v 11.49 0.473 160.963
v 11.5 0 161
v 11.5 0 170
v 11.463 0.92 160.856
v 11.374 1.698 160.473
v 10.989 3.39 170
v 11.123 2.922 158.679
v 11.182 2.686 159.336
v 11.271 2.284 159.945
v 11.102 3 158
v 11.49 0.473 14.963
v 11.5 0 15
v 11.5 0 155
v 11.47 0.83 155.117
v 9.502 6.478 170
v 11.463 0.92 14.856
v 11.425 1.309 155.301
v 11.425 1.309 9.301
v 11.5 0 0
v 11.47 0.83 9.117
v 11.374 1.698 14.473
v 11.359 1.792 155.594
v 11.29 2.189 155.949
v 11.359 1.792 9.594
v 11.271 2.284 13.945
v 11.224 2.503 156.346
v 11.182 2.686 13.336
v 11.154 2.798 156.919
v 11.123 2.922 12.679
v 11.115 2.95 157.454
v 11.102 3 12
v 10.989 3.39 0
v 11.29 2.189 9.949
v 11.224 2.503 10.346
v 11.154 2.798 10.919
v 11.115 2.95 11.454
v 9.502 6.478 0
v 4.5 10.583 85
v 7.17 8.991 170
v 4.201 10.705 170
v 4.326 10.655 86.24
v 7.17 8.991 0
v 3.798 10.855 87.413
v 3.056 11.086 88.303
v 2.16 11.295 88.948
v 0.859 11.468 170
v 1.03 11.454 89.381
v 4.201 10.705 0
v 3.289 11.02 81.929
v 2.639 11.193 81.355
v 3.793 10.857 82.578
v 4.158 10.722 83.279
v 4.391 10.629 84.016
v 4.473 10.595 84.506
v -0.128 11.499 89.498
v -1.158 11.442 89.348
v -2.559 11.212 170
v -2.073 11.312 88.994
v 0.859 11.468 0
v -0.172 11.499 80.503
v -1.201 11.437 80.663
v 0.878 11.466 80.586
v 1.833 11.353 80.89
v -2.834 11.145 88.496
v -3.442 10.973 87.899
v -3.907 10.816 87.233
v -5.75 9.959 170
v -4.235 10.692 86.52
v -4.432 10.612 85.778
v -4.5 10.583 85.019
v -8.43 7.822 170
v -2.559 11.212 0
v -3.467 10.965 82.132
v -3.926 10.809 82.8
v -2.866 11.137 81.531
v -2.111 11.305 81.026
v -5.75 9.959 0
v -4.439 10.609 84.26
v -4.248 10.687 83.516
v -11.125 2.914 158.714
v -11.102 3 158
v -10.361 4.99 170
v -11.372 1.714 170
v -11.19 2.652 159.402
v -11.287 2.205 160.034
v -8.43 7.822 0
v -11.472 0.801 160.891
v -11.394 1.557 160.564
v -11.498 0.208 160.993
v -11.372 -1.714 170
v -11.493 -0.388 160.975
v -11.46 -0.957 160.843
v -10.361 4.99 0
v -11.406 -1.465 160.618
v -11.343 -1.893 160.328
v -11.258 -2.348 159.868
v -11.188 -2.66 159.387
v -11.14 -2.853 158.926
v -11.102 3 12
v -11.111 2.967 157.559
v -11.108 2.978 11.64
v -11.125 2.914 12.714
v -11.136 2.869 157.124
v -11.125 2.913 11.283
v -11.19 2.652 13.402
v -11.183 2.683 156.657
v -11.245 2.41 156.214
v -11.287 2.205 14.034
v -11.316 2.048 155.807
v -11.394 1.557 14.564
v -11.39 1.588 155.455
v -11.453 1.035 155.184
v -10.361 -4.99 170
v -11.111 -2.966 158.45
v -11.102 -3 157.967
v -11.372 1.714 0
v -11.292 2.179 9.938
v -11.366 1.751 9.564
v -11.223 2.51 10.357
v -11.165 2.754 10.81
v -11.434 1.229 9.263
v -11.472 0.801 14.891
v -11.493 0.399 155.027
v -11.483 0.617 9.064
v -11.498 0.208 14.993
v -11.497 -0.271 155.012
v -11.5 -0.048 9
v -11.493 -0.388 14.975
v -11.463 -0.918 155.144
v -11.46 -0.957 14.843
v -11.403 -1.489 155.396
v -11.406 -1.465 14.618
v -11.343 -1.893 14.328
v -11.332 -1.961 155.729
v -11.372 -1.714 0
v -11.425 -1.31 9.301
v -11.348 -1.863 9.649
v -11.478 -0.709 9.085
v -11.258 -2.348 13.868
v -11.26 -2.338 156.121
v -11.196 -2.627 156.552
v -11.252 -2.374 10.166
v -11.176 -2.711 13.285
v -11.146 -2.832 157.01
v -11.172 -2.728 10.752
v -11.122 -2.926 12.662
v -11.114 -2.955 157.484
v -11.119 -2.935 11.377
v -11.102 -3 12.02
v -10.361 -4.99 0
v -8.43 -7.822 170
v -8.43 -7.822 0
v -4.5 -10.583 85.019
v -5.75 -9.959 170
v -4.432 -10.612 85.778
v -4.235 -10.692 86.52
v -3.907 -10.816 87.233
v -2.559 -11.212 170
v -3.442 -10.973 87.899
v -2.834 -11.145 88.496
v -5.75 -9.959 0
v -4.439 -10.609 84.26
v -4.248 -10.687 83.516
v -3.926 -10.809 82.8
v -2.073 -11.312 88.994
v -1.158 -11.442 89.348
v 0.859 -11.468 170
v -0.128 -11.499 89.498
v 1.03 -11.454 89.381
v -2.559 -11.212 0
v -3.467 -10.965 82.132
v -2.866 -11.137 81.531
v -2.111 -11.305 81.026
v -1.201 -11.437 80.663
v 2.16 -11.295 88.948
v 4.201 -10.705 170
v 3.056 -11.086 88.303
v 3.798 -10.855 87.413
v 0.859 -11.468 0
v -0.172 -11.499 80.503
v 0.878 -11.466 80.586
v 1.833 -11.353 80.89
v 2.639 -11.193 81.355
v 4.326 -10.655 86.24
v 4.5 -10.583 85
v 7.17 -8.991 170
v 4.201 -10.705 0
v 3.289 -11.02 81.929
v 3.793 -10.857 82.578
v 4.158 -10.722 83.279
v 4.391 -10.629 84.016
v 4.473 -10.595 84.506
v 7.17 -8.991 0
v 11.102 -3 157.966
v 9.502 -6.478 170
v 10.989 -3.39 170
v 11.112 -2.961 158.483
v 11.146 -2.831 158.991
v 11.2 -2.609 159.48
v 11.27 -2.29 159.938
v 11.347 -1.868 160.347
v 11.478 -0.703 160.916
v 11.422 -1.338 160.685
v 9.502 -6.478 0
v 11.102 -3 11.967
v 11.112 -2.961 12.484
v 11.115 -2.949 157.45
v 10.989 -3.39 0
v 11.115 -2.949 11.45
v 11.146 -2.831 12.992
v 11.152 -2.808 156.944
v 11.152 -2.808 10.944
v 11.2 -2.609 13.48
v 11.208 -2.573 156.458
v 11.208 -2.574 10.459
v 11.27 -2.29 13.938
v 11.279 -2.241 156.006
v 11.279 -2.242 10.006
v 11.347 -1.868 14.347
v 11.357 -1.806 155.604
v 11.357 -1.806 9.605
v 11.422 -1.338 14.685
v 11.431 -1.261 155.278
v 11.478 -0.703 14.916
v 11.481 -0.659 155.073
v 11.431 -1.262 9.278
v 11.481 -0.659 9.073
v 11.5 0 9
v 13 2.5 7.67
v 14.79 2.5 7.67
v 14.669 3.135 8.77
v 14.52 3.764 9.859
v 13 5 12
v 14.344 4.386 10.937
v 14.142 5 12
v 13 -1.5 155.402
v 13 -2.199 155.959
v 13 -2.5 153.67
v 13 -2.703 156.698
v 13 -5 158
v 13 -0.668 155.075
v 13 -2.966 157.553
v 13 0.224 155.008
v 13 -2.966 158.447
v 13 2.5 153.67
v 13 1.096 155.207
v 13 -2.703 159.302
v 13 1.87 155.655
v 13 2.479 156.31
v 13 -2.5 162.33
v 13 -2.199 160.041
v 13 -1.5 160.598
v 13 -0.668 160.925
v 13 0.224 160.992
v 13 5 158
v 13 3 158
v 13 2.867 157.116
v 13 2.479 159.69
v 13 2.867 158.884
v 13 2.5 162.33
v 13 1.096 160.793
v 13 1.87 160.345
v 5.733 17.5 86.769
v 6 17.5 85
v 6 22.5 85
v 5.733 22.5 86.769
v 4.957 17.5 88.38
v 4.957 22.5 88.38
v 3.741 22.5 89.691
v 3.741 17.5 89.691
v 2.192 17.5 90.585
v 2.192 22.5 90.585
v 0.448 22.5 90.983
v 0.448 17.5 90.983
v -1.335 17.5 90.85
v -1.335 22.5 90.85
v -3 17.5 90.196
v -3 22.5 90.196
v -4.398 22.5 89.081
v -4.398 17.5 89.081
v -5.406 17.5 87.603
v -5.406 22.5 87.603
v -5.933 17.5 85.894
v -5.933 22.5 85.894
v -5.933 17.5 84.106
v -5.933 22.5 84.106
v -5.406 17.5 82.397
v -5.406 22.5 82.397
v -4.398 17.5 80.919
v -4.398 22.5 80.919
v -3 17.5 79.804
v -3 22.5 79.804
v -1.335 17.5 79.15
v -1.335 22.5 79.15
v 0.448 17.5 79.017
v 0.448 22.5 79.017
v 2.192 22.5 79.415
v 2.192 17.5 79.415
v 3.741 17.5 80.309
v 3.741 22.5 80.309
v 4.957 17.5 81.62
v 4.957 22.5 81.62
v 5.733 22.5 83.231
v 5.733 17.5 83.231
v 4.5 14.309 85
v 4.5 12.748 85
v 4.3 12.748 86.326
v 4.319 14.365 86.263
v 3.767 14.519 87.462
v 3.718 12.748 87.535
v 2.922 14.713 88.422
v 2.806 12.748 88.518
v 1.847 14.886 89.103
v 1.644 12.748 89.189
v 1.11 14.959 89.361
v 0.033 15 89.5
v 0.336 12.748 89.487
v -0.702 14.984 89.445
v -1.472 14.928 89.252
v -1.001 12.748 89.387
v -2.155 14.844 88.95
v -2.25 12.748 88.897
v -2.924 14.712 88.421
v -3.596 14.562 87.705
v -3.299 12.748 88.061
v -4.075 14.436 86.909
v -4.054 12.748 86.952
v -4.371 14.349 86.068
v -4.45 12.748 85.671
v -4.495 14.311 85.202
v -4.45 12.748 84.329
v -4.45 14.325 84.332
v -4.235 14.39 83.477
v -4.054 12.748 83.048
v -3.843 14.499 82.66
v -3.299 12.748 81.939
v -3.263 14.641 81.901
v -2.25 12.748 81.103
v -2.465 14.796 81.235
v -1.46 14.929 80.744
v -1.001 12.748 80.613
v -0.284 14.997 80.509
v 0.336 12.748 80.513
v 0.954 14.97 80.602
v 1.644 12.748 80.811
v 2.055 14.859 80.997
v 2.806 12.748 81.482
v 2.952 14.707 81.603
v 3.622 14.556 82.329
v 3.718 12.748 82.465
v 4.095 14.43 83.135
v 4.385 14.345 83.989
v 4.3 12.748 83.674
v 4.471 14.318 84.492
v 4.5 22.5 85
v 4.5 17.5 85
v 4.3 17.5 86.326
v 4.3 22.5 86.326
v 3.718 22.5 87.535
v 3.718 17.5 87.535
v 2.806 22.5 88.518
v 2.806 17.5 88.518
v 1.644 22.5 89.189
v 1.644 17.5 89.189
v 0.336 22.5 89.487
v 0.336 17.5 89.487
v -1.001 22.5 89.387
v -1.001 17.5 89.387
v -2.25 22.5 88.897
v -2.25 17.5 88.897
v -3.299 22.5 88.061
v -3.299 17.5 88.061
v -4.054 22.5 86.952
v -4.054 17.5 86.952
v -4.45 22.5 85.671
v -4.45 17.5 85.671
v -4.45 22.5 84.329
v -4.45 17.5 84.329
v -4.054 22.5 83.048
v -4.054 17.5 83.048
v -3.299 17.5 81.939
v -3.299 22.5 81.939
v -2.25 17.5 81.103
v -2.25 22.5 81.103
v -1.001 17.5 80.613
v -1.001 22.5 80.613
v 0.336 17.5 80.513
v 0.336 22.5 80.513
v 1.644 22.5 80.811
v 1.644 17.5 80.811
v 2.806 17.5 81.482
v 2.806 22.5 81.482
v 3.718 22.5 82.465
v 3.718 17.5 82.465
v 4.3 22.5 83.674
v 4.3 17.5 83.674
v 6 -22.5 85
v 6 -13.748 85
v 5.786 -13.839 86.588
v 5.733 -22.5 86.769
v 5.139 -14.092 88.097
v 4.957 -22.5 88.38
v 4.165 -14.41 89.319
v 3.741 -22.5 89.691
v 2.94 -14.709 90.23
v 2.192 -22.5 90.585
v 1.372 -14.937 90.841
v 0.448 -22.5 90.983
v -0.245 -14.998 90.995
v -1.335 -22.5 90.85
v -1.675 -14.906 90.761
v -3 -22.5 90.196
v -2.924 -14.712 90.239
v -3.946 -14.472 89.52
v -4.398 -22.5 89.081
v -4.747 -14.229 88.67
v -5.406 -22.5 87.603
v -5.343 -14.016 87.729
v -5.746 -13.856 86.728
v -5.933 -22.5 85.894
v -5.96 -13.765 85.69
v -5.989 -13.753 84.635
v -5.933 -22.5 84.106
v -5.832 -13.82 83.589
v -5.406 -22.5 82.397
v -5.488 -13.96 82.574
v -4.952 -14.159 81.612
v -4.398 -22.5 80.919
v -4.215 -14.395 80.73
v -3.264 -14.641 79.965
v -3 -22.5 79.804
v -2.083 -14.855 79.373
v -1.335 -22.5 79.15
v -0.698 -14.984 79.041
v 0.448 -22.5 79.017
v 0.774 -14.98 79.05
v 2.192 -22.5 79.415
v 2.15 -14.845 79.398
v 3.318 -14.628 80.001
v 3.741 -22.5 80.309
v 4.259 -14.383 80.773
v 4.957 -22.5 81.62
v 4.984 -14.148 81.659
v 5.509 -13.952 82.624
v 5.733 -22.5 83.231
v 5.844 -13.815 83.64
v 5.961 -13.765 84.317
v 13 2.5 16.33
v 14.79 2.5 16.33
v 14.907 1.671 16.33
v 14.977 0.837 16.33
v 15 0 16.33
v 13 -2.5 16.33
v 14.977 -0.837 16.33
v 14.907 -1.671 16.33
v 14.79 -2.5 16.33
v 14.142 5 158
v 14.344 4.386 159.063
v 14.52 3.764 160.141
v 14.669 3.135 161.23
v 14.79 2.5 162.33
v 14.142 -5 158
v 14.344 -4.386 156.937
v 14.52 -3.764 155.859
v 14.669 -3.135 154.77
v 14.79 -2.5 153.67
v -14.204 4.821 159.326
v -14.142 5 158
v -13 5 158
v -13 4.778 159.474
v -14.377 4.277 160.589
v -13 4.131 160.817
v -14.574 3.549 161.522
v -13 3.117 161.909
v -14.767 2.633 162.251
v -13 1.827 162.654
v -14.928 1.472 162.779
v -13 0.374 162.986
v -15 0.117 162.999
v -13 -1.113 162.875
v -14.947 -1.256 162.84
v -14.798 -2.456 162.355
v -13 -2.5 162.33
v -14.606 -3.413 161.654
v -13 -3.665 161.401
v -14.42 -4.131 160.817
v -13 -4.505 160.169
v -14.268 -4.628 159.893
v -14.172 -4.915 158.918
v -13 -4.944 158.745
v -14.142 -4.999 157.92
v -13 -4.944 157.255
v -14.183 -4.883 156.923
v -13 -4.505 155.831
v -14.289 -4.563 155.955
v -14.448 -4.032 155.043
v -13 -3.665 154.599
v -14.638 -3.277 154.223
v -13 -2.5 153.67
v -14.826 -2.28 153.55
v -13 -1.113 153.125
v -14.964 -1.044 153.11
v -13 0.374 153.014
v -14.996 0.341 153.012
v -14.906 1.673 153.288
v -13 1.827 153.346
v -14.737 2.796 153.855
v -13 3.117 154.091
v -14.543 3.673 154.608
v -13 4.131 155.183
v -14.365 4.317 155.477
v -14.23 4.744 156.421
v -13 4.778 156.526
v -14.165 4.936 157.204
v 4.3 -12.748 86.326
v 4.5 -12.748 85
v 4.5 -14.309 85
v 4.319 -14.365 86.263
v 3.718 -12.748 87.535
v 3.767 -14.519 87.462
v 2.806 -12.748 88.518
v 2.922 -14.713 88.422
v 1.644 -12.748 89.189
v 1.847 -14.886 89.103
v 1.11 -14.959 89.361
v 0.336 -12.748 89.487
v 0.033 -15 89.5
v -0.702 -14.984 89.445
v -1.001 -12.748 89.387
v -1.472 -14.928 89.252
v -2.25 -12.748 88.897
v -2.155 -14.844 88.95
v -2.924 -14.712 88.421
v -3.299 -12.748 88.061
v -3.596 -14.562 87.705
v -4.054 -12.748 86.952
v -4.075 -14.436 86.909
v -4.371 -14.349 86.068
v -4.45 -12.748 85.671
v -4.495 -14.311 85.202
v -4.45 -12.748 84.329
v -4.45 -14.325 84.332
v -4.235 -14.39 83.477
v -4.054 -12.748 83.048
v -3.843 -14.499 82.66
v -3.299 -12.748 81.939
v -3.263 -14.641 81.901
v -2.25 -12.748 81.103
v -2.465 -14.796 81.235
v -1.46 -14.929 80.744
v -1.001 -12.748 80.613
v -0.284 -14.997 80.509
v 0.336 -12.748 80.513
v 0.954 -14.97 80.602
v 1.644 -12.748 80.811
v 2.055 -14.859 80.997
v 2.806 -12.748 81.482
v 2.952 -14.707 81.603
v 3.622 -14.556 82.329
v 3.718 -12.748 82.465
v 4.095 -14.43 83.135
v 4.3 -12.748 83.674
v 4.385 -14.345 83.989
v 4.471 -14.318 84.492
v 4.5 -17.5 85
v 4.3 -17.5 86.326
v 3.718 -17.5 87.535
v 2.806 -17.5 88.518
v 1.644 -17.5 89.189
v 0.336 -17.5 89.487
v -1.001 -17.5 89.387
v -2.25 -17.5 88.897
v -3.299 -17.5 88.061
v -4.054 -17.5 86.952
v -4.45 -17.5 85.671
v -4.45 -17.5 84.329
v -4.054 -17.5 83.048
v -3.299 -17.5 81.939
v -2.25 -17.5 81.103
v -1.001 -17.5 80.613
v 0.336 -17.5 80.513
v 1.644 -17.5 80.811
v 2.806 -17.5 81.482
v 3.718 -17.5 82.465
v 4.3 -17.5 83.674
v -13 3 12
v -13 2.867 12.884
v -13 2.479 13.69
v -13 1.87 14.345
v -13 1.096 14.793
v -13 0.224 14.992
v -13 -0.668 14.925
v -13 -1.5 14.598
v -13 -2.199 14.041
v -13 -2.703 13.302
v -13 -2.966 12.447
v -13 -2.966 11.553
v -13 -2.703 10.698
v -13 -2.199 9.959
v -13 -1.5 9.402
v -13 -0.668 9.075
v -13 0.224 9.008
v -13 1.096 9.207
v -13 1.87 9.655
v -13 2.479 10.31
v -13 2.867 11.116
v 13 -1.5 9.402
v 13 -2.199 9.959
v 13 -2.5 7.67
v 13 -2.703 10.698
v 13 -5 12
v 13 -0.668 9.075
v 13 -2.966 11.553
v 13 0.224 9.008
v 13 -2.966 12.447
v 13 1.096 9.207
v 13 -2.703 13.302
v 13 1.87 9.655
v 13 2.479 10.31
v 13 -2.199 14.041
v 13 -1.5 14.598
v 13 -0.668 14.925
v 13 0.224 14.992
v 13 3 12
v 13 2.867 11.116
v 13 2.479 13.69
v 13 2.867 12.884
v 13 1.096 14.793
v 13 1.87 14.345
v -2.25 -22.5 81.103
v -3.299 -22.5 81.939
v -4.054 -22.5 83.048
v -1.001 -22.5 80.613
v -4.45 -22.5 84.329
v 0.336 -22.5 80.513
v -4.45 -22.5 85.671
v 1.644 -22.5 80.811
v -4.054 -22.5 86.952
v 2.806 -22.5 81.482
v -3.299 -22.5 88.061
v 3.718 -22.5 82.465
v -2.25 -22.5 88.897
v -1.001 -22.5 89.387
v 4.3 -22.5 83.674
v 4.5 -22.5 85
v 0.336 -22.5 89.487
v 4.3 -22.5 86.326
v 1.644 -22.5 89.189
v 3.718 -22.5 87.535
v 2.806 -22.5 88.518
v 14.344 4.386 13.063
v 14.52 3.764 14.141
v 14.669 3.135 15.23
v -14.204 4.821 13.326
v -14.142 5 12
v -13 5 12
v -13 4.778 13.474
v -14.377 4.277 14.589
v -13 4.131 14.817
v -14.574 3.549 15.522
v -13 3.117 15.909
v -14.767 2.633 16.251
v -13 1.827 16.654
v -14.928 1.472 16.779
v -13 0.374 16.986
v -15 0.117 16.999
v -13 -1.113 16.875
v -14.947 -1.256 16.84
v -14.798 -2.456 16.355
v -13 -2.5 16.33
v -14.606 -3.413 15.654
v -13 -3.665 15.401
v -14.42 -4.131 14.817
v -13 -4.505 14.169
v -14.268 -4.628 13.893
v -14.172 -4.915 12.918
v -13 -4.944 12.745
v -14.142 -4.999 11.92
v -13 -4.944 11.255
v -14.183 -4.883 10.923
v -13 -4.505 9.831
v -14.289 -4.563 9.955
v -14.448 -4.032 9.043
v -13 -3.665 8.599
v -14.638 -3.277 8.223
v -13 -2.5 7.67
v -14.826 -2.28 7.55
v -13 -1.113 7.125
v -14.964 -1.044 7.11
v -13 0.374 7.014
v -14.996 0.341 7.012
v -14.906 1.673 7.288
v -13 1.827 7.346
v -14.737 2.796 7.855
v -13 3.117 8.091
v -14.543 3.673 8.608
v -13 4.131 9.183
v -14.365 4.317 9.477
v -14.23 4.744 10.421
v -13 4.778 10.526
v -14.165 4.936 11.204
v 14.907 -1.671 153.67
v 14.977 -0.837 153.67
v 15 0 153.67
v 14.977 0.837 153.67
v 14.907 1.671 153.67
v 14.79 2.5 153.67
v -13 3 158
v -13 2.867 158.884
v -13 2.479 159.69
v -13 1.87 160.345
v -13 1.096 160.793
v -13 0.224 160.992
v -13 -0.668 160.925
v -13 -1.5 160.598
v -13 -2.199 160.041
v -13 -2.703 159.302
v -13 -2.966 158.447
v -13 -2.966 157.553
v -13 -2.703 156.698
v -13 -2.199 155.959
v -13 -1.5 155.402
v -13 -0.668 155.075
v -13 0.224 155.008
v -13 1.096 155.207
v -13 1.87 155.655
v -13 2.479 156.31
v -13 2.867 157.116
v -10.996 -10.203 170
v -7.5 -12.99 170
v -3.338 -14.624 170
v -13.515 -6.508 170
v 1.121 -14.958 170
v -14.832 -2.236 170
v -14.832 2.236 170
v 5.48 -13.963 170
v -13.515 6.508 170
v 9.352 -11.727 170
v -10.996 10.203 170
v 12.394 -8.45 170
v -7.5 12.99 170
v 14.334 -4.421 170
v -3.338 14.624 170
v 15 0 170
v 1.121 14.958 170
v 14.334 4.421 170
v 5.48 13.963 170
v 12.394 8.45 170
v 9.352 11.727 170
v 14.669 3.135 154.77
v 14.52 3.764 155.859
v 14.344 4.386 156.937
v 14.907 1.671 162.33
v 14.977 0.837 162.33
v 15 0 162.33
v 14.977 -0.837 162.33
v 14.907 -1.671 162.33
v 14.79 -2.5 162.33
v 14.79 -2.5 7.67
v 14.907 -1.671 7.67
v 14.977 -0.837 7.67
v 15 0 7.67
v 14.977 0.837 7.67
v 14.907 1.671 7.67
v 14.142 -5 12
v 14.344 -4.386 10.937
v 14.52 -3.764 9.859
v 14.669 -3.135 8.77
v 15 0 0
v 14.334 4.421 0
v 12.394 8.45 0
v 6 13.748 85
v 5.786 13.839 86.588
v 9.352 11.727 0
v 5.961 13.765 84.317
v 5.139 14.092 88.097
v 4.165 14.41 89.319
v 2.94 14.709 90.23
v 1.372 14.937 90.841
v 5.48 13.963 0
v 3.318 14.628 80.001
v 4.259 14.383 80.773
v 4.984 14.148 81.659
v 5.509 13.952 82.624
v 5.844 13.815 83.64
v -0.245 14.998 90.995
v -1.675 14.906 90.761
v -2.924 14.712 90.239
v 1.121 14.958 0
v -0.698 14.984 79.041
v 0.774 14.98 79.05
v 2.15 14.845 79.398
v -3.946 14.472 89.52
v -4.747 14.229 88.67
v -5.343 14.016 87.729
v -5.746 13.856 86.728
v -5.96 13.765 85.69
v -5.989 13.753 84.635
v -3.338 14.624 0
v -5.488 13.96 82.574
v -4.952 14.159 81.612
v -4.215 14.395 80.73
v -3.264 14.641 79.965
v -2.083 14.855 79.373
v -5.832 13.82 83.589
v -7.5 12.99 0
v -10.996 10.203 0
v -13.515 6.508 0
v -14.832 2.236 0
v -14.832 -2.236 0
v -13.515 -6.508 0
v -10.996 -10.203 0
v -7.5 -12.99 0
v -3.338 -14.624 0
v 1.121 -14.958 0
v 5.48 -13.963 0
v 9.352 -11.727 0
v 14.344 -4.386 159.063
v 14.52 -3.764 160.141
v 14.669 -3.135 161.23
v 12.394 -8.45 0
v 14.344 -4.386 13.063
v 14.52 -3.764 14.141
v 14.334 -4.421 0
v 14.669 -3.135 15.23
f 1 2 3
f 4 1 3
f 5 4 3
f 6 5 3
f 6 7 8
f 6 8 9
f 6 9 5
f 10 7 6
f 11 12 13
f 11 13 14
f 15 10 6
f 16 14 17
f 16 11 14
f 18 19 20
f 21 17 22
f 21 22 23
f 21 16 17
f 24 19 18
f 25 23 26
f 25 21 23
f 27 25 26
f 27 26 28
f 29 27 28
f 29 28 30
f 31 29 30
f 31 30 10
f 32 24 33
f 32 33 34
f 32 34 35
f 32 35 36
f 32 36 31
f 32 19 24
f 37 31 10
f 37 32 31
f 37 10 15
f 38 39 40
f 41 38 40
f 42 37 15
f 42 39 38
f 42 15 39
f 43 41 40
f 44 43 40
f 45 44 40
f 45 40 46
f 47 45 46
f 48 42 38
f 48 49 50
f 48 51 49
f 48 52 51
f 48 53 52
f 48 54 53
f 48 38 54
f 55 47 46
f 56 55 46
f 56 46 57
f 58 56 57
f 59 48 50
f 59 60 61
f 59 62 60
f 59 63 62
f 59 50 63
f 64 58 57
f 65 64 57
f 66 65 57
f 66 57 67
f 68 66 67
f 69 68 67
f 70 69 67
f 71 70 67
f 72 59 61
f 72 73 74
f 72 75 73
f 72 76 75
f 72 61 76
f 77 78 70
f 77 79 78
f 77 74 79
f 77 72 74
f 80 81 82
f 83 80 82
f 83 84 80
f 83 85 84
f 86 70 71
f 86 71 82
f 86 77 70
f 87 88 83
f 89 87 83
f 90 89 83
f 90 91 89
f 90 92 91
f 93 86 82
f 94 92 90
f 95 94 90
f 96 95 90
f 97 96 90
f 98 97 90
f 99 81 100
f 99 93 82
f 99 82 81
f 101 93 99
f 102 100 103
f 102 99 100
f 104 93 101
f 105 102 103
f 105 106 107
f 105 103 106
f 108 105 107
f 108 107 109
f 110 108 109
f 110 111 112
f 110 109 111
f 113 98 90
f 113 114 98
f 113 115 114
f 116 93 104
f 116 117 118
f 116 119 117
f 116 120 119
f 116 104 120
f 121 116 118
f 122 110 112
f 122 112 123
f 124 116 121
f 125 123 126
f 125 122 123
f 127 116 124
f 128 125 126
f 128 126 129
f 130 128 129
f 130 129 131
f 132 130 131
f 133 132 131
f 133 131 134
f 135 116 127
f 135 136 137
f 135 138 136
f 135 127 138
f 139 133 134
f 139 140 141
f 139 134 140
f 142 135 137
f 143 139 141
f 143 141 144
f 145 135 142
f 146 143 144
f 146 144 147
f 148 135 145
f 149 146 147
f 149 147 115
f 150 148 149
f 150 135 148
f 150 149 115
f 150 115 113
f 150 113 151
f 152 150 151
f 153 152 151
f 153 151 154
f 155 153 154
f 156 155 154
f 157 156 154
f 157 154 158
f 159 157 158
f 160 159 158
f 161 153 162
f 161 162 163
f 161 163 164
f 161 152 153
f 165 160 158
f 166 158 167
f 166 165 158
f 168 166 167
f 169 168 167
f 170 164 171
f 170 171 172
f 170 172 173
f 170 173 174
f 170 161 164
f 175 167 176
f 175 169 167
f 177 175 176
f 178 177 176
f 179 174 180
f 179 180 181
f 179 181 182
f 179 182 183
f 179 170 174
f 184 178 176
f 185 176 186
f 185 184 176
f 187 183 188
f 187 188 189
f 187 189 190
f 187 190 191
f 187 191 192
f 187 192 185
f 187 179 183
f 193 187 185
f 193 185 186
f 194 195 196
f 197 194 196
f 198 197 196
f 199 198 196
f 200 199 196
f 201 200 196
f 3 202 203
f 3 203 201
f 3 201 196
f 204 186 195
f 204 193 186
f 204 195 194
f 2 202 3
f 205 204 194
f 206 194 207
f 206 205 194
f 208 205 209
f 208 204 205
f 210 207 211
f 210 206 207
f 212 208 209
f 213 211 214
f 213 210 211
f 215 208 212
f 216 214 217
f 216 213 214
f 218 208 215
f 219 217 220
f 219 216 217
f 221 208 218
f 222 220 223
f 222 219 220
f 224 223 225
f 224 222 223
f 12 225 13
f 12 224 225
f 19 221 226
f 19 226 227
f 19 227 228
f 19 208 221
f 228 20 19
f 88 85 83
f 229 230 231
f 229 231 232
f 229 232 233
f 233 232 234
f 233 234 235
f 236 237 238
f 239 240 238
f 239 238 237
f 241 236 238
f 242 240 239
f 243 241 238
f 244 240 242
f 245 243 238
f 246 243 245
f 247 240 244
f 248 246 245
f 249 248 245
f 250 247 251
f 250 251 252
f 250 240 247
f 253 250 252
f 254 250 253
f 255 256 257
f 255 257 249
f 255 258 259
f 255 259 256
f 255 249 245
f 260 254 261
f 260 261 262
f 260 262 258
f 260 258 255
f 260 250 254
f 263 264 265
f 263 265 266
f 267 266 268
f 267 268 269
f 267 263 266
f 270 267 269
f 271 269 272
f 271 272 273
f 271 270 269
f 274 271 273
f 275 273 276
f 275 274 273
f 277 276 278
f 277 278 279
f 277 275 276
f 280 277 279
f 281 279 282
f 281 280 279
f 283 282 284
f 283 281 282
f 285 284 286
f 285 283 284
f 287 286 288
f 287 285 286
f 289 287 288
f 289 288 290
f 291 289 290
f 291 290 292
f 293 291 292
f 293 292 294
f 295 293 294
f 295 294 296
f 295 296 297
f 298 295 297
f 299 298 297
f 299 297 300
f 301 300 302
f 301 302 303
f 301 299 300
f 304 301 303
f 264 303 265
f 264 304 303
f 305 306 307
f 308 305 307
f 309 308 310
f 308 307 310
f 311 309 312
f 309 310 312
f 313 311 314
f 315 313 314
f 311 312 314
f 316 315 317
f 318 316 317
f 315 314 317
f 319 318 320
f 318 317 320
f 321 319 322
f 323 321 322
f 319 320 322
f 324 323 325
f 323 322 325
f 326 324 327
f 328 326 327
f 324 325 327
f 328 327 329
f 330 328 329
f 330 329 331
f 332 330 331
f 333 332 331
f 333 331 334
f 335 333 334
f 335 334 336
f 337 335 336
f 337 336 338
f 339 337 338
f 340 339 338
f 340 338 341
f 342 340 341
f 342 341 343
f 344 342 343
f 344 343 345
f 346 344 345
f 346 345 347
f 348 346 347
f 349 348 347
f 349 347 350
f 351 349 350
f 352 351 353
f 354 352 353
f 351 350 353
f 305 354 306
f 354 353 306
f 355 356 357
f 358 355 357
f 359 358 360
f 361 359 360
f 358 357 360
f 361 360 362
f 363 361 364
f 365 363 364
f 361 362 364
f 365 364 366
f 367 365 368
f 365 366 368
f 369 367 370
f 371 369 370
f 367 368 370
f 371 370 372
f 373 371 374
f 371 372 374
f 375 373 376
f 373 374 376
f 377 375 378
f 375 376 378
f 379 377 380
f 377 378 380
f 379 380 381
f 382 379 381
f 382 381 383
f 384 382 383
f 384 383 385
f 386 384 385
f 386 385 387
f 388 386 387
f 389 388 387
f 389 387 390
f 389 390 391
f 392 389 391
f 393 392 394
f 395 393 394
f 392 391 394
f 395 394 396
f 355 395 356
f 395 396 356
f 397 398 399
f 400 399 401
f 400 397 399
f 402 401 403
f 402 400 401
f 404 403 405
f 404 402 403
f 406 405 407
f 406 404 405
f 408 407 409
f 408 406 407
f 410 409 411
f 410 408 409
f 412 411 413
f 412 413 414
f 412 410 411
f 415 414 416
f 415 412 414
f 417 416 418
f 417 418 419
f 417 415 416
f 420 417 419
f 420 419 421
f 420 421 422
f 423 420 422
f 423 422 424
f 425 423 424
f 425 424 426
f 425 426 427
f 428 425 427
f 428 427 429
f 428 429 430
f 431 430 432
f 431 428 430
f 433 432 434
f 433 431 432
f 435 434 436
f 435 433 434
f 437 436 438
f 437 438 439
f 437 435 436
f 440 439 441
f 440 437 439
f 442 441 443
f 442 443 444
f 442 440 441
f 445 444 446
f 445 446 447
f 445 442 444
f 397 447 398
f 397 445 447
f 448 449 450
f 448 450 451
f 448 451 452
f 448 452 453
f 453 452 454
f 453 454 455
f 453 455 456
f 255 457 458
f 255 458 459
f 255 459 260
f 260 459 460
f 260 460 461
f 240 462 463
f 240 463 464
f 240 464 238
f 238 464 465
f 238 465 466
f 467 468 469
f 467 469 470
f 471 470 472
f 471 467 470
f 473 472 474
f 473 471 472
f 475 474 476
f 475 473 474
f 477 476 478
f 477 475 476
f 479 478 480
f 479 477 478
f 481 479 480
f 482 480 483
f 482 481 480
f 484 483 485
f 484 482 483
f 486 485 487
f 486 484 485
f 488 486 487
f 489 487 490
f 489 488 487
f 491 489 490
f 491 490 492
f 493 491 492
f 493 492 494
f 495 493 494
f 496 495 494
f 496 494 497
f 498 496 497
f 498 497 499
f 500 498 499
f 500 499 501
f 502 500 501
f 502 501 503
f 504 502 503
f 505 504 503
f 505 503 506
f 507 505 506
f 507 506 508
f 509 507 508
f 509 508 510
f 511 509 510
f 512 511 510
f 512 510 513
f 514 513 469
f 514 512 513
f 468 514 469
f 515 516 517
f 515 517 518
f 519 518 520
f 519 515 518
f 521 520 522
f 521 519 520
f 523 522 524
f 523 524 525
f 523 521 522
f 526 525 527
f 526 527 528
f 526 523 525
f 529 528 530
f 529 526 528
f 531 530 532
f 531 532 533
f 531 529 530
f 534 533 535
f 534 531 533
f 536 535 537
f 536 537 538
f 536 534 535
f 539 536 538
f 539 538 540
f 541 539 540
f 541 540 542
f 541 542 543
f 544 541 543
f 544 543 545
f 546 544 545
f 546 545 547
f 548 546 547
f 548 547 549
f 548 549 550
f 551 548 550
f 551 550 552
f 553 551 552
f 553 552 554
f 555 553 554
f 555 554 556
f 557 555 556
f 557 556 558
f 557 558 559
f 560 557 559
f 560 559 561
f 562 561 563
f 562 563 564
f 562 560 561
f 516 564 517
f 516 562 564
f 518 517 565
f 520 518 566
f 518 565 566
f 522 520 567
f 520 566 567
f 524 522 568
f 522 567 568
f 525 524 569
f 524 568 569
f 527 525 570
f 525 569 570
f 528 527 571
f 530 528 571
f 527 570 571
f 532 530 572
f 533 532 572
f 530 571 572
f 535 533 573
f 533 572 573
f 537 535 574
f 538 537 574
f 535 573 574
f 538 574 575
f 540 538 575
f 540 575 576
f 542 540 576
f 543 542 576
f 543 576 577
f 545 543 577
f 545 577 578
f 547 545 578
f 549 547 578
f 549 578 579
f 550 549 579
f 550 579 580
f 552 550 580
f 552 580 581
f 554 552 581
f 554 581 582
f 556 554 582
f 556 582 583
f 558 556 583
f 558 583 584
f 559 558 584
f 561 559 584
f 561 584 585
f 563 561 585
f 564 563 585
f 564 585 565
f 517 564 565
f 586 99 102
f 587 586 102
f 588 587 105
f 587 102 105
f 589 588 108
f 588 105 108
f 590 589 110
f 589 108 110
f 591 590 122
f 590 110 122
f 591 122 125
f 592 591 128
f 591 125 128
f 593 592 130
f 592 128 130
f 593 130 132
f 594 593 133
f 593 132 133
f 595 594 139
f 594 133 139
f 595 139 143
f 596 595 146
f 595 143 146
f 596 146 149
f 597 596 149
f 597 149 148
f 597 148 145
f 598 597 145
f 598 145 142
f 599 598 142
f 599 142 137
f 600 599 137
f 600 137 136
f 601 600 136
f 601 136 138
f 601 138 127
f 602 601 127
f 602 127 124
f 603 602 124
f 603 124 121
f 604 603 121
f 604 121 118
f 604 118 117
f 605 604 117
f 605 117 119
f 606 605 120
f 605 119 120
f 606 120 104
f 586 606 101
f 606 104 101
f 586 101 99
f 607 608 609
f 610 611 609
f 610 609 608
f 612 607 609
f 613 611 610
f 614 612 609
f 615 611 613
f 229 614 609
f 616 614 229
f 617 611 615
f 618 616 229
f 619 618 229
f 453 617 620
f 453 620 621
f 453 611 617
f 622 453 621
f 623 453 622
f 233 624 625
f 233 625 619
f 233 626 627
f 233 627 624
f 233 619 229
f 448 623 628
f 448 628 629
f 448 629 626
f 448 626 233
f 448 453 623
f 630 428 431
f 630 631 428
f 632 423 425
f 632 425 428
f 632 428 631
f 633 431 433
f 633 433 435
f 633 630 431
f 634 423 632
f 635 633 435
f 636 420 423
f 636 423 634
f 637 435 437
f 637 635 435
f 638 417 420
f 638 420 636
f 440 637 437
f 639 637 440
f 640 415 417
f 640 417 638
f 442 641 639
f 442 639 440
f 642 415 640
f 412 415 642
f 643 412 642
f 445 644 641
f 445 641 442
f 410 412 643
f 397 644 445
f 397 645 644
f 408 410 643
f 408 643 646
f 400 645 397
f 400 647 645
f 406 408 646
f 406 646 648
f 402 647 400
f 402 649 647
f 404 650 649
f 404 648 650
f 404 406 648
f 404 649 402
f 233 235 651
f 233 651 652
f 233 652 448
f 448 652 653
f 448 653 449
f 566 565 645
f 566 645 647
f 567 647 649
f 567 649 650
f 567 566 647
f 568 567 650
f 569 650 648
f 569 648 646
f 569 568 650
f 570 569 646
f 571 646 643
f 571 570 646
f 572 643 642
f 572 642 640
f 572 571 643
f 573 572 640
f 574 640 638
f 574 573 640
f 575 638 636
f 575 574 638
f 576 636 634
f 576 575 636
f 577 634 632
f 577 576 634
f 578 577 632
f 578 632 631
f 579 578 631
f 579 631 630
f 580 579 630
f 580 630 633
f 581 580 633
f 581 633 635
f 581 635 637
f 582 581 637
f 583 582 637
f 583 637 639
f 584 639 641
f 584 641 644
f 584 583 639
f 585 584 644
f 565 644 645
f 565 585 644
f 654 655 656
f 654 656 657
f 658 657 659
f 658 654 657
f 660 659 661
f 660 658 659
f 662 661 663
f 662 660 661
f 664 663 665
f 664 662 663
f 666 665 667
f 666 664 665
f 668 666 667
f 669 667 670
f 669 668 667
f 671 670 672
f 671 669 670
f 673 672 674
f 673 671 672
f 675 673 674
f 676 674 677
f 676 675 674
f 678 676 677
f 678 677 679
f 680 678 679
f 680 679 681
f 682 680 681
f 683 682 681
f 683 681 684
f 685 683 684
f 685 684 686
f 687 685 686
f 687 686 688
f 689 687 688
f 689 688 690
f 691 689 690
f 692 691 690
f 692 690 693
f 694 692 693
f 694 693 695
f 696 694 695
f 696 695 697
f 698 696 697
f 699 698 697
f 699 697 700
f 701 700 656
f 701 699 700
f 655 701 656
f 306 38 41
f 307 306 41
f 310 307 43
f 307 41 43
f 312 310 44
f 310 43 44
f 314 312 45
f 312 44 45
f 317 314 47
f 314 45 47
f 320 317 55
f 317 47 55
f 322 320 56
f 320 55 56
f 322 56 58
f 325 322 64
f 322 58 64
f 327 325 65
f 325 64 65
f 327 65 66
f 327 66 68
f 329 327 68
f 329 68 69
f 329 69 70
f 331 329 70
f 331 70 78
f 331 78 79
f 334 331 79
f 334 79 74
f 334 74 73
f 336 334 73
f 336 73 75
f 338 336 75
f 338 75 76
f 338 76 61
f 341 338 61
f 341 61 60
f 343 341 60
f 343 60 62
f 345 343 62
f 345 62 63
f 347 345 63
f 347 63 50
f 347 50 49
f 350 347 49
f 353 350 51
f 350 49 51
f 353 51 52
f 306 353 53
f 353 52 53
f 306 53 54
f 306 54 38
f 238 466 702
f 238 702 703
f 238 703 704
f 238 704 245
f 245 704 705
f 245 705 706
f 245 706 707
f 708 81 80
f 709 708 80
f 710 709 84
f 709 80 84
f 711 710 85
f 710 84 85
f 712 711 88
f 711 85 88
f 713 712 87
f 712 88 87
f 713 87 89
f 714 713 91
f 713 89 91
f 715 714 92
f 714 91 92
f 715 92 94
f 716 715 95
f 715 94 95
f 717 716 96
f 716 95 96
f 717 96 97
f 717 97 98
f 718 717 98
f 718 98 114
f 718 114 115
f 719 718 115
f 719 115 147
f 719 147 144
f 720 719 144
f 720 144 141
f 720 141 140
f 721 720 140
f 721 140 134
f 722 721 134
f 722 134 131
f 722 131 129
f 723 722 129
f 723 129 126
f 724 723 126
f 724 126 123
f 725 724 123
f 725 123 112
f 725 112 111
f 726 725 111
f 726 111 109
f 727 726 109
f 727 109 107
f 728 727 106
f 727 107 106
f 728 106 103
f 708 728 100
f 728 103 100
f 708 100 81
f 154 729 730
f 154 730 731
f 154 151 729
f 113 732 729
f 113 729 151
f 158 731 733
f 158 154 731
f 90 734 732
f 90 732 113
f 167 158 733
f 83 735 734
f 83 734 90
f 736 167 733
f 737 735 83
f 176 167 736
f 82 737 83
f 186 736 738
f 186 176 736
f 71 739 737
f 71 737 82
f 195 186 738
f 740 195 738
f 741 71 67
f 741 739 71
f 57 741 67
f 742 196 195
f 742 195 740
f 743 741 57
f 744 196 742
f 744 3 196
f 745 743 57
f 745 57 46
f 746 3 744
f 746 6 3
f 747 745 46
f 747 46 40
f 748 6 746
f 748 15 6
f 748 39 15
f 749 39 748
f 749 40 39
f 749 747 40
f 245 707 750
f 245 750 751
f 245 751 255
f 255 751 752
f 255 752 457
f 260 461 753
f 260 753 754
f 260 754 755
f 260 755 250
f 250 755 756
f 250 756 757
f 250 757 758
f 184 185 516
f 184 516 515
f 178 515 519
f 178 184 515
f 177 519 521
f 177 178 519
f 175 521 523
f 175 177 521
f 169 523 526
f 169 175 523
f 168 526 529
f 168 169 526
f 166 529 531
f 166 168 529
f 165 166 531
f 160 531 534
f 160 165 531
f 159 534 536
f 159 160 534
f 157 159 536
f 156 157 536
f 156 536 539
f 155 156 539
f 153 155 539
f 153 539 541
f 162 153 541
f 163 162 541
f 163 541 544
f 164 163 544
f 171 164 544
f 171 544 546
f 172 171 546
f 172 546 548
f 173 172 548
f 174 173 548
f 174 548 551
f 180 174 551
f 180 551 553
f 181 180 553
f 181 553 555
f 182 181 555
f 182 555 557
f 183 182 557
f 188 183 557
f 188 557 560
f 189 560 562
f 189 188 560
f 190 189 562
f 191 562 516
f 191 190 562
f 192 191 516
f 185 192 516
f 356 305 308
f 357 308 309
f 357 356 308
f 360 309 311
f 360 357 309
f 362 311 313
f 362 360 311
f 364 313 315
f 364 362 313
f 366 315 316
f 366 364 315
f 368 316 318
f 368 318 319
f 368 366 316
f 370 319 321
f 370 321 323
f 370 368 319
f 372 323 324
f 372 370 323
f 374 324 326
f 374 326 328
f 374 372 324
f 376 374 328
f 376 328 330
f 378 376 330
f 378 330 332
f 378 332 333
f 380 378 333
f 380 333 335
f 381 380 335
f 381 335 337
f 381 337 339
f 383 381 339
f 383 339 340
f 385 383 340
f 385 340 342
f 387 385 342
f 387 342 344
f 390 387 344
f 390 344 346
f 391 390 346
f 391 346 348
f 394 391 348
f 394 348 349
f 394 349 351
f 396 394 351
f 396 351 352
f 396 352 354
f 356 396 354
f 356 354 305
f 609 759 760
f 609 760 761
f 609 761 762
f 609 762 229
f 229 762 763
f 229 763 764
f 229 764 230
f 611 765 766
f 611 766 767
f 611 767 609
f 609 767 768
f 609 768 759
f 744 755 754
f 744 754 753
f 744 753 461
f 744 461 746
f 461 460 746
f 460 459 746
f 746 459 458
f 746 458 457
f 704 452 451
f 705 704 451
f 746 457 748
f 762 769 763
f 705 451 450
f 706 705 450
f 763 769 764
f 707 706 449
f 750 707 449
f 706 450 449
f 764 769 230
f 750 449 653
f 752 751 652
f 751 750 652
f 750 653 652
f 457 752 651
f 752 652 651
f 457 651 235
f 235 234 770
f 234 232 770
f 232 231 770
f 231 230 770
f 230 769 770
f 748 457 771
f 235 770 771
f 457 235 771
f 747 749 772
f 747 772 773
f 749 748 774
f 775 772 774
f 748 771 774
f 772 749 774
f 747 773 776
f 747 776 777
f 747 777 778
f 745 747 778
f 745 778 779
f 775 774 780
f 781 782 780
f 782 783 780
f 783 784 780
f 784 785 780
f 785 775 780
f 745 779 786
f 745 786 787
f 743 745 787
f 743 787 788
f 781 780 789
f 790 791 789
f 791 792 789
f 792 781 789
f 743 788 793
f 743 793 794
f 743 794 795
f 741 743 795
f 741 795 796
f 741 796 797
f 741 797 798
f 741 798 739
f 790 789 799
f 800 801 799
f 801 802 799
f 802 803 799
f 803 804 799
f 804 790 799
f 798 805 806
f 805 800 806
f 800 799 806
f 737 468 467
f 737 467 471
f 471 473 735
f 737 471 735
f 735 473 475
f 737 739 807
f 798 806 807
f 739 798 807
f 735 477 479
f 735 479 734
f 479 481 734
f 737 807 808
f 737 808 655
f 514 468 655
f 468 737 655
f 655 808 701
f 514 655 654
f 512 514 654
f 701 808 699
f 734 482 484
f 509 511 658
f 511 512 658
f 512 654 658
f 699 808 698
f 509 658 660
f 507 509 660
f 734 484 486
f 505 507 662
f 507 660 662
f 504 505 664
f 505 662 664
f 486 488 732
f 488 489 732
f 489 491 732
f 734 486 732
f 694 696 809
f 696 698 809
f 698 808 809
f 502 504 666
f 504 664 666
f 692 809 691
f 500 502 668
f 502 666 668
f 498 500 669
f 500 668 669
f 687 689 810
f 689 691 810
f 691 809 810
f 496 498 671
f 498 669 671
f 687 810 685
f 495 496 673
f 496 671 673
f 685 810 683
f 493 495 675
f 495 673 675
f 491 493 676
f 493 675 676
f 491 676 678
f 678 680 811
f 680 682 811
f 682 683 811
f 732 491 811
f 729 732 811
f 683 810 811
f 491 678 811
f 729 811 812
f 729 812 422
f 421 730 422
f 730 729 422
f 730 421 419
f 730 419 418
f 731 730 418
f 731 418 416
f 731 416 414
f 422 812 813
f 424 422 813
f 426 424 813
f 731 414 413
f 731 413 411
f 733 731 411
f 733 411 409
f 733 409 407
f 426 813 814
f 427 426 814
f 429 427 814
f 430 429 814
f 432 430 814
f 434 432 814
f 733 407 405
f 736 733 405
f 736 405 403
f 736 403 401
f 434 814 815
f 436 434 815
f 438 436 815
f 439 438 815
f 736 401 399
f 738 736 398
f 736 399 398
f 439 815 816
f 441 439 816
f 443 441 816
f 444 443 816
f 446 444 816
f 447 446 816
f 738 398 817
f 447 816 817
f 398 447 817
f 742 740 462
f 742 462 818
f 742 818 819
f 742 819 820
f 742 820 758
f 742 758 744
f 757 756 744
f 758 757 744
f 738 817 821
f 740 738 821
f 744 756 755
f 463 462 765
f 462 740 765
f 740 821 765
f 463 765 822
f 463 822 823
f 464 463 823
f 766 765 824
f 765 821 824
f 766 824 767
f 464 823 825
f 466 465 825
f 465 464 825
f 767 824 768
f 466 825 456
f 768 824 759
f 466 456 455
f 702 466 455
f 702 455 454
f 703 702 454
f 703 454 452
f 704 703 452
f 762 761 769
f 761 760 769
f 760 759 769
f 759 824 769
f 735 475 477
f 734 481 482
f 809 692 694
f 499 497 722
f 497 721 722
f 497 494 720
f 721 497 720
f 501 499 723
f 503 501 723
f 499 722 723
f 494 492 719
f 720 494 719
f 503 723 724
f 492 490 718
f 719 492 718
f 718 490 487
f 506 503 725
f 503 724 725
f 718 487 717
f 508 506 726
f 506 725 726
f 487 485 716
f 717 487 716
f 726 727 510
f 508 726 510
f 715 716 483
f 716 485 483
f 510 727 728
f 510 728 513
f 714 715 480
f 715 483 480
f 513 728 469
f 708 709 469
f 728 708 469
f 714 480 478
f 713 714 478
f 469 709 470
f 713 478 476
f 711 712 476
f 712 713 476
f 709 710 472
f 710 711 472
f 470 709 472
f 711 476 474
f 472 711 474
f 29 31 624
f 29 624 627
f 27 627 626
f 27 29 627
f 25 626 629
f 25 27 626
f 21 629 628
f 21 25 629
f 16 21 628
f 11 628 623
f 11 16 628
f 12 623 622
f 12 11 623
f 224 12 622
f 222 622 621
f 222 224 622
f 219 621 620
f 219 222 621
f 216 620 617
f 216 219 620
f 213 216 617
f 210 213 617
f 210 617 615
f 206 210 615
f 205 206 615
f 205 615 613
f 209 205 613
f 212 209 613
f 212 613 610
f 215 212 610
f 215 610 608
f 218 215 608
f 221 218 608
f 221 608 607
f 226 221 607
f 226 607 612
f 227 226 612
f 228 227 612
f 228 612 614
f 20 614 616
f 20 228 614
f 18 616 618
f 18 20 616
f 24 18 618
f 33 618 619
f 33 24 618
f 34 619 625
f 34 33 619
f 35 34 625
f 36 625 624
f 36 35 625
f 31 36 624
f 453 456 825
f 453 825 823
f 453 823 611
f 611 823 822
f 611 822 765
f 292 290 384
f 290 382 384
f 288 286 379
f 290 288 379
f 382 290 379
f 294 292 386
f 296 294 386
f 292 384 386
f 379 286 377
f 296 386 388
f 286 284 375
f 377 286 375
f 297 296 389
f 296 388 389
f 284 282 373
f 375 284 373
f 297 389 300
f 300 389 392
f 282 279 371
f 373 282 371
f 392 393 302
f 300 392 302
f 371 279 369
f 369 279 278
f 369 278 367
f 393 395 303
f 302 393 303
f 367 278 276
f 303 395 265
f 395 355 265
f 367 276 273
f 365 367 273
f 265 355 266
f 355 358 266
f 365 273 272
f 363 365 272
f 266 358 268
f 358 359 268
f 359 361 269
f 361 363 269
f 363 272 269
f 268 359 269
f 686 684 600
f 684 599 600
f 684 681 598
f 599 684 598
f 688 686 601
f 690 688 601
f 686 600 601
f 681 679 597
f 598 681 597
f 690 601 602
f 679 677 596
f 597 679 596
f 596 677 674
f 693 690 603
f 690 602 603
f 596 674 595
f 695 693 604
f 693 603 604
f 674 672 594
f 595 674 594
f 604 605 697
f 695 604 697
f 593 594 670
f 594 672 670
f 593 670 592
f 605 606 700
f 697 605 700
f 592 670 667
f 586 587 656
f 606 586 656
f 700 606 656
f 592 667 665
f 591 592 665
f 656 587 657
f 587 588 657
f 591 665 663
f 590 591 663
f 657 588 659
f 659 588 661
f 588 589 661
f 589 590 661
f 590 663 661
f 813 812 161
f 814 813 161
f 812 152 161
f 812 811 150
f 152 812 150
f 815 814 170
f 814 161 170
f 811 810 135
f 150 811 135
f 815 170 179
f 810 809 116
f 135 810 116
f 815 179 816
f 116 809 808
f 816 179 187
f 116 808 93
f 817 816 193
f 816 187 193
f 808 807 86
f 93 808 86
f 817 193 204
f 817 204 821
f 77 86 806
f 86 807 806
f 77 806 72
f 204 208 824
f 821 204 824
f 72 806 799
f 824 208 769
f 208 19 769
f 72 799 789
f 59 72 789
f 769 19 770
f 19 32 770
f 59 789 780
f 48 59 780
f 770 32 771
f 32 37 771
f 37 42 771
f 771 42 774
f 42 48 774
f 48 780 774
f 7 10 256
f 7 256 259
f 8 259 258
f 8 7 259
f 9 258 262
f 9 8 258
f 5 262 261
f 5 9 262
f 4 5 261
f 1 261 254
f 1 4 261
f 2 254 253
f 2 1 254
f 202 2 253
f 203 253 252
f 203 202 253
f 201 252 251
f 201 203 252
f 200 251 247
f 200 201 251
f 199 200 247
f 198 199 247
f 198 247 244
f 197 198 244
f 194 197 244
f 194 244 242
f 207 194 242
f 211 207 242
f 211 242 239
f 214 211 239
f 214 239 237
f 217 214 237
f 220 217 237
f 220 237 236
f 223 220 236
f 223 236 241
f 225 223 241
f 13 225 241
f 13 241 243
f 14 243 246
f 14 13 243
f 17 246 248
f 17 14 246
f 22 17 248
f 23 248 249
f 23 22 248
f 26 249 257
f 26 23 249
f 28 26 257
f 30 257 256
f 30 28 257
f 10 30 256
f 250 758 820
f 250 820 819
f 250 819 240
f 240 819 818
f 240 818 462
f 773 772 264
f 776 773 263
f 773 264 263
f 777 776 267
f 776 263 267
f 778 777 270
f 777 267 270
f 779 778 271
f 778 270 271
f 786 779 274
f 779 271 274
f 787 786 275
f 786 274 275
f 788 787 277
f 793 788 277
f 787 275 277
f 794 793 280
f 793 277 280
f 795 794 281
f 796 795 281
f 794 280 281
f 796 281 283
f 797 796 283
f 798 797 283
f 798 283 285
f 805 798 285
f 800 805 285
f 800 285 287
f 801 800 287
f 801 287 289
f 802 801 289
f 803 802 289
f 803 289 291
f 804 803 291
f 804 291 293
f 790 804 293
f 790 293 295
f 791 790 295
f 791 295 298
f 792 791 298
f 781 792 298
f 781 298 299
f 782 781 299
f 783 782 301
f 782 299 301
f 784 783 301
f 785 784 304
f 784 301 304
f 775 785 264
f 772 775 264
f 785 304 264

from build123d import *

# Parameters (mm, degrees)
F0_R           = 15
F0_R_2         = 11.5
F1_DEPTH       = 170
F2_R           = 4.5
F3_DEPTH       = 15.001
F3_DEPTH_BACK  = 15.001
F5_R           = 6
F5_R_2         = 4.5
F6_DEPTH       = 5
F6_DEPTH_BACK  = 4.7522730151
F8_R           = 6
F8_R_2         = 4.5
F9_DEPTH       = 5
F9_DEPTH_BACK  = 4.7522730151
F10_R          = 3
F11_DEPTH      = 15.0010001
F11_DEPTH_BACK = 15.0010001
F14_DEPTH      = 2
F16_R          = 5
F17_DEPTH      = 2


with BuildPart() as f1:
    # F0 (on Top) → F1 (new body)
    with BuildSketch(Plane.XY):
        Circle(F0_R)
        Circle(F0_R_2, mode=Mode.SUBTRACT)
    extrude(amount=F1_DEPTH)

    # F2 (on Front) → F3 (cut, two sides)
    with BuildSketch(Plane.XZ) as f3_sk:
        with Locations((0, 85)):
            Circle(F2_R)
    extrude(amount=-F3_DEPTH, mode=Mode.SUBTRACT)
    extrude(f3_sk.sketch, amount=F3_DEPTH_BACK, mode=Mode.SUBTRACT)

    # F5 (on offset) → F6 (join, two sides)
    with BuildSketch(Plane.XZ.offset(17.5)) as f6_sk:
        with Locations((0, 85)):
            Circle(F5_R)
        with Locations((0, 85)):
            Circle(F5_R_2, mode=Mode.SUBTRACT)
    extrude(amount=F6_DEPTH)
    extrude(f6_sk.sketch, amount=-F6_DEPTH_BACK)

    # F8 (on offset) → F9 (join, two sides)
    with BuildSketch(Plane.XZ.offset(-17.5)) as f9_sk:
        with Locations((0, 85)):
            Circle(F8_R)
        with Locations((0, 85)):
            Circle(F8_R_2, mode=Mode.SUBTRACT)
    extrude(amount=-F9_DEPTH)
    extrude(f9_sk.sketch, amount=F9_DEPTH_BACK)

    # F10 (on Right) → F11 (cut, two sides)
    with BuildSketch(Plane.YZ) as f11_sk:
        with Locations((0, 12)):
            Circle(F10_R)
        with Locations((0, 158)):
            Circle(F10_R)
    extrude(amount=-F11_DEPTH, mode=Mode.SUBTRACT)
    extrude(f11_sk.sketch, amount=F11_DEPTH_BACK, mode=Mode.SUBTRACT)

    # F13 (on offset) → F14 (cut)
    with BuildSketch(Plane.YZ.offset(15)):
        Polygon((-2.5, 162.3301270189), (-5, 158), (-2.5, 153.6698729811), (2.5, 153.6698729811), (5, 158), (2.5, 162.3301270189), align=None)
        Polygon((5, 12), (2.5, 16.3301270189), (-2.5, 16.3301270189), (-5, 12), (-2.5, 7.6698729811), (2.5, 7.6698729811), align=None)
    extrude(amount=-F14_DEPTH, mode=Mode.SUBTRACT)

    # F16 (on offset) → F17 (cut)
    with BuildSketch(Plane.YZ.offset(-15)):
        with Locations((0, 158)):
            Circle(F16_R)
        with Locations((0, 12)):
            Circle(F16_R)
    extrude(amount=F17_DEPTH, mode=Mode.SUBTRACT)


solid = f1.part
